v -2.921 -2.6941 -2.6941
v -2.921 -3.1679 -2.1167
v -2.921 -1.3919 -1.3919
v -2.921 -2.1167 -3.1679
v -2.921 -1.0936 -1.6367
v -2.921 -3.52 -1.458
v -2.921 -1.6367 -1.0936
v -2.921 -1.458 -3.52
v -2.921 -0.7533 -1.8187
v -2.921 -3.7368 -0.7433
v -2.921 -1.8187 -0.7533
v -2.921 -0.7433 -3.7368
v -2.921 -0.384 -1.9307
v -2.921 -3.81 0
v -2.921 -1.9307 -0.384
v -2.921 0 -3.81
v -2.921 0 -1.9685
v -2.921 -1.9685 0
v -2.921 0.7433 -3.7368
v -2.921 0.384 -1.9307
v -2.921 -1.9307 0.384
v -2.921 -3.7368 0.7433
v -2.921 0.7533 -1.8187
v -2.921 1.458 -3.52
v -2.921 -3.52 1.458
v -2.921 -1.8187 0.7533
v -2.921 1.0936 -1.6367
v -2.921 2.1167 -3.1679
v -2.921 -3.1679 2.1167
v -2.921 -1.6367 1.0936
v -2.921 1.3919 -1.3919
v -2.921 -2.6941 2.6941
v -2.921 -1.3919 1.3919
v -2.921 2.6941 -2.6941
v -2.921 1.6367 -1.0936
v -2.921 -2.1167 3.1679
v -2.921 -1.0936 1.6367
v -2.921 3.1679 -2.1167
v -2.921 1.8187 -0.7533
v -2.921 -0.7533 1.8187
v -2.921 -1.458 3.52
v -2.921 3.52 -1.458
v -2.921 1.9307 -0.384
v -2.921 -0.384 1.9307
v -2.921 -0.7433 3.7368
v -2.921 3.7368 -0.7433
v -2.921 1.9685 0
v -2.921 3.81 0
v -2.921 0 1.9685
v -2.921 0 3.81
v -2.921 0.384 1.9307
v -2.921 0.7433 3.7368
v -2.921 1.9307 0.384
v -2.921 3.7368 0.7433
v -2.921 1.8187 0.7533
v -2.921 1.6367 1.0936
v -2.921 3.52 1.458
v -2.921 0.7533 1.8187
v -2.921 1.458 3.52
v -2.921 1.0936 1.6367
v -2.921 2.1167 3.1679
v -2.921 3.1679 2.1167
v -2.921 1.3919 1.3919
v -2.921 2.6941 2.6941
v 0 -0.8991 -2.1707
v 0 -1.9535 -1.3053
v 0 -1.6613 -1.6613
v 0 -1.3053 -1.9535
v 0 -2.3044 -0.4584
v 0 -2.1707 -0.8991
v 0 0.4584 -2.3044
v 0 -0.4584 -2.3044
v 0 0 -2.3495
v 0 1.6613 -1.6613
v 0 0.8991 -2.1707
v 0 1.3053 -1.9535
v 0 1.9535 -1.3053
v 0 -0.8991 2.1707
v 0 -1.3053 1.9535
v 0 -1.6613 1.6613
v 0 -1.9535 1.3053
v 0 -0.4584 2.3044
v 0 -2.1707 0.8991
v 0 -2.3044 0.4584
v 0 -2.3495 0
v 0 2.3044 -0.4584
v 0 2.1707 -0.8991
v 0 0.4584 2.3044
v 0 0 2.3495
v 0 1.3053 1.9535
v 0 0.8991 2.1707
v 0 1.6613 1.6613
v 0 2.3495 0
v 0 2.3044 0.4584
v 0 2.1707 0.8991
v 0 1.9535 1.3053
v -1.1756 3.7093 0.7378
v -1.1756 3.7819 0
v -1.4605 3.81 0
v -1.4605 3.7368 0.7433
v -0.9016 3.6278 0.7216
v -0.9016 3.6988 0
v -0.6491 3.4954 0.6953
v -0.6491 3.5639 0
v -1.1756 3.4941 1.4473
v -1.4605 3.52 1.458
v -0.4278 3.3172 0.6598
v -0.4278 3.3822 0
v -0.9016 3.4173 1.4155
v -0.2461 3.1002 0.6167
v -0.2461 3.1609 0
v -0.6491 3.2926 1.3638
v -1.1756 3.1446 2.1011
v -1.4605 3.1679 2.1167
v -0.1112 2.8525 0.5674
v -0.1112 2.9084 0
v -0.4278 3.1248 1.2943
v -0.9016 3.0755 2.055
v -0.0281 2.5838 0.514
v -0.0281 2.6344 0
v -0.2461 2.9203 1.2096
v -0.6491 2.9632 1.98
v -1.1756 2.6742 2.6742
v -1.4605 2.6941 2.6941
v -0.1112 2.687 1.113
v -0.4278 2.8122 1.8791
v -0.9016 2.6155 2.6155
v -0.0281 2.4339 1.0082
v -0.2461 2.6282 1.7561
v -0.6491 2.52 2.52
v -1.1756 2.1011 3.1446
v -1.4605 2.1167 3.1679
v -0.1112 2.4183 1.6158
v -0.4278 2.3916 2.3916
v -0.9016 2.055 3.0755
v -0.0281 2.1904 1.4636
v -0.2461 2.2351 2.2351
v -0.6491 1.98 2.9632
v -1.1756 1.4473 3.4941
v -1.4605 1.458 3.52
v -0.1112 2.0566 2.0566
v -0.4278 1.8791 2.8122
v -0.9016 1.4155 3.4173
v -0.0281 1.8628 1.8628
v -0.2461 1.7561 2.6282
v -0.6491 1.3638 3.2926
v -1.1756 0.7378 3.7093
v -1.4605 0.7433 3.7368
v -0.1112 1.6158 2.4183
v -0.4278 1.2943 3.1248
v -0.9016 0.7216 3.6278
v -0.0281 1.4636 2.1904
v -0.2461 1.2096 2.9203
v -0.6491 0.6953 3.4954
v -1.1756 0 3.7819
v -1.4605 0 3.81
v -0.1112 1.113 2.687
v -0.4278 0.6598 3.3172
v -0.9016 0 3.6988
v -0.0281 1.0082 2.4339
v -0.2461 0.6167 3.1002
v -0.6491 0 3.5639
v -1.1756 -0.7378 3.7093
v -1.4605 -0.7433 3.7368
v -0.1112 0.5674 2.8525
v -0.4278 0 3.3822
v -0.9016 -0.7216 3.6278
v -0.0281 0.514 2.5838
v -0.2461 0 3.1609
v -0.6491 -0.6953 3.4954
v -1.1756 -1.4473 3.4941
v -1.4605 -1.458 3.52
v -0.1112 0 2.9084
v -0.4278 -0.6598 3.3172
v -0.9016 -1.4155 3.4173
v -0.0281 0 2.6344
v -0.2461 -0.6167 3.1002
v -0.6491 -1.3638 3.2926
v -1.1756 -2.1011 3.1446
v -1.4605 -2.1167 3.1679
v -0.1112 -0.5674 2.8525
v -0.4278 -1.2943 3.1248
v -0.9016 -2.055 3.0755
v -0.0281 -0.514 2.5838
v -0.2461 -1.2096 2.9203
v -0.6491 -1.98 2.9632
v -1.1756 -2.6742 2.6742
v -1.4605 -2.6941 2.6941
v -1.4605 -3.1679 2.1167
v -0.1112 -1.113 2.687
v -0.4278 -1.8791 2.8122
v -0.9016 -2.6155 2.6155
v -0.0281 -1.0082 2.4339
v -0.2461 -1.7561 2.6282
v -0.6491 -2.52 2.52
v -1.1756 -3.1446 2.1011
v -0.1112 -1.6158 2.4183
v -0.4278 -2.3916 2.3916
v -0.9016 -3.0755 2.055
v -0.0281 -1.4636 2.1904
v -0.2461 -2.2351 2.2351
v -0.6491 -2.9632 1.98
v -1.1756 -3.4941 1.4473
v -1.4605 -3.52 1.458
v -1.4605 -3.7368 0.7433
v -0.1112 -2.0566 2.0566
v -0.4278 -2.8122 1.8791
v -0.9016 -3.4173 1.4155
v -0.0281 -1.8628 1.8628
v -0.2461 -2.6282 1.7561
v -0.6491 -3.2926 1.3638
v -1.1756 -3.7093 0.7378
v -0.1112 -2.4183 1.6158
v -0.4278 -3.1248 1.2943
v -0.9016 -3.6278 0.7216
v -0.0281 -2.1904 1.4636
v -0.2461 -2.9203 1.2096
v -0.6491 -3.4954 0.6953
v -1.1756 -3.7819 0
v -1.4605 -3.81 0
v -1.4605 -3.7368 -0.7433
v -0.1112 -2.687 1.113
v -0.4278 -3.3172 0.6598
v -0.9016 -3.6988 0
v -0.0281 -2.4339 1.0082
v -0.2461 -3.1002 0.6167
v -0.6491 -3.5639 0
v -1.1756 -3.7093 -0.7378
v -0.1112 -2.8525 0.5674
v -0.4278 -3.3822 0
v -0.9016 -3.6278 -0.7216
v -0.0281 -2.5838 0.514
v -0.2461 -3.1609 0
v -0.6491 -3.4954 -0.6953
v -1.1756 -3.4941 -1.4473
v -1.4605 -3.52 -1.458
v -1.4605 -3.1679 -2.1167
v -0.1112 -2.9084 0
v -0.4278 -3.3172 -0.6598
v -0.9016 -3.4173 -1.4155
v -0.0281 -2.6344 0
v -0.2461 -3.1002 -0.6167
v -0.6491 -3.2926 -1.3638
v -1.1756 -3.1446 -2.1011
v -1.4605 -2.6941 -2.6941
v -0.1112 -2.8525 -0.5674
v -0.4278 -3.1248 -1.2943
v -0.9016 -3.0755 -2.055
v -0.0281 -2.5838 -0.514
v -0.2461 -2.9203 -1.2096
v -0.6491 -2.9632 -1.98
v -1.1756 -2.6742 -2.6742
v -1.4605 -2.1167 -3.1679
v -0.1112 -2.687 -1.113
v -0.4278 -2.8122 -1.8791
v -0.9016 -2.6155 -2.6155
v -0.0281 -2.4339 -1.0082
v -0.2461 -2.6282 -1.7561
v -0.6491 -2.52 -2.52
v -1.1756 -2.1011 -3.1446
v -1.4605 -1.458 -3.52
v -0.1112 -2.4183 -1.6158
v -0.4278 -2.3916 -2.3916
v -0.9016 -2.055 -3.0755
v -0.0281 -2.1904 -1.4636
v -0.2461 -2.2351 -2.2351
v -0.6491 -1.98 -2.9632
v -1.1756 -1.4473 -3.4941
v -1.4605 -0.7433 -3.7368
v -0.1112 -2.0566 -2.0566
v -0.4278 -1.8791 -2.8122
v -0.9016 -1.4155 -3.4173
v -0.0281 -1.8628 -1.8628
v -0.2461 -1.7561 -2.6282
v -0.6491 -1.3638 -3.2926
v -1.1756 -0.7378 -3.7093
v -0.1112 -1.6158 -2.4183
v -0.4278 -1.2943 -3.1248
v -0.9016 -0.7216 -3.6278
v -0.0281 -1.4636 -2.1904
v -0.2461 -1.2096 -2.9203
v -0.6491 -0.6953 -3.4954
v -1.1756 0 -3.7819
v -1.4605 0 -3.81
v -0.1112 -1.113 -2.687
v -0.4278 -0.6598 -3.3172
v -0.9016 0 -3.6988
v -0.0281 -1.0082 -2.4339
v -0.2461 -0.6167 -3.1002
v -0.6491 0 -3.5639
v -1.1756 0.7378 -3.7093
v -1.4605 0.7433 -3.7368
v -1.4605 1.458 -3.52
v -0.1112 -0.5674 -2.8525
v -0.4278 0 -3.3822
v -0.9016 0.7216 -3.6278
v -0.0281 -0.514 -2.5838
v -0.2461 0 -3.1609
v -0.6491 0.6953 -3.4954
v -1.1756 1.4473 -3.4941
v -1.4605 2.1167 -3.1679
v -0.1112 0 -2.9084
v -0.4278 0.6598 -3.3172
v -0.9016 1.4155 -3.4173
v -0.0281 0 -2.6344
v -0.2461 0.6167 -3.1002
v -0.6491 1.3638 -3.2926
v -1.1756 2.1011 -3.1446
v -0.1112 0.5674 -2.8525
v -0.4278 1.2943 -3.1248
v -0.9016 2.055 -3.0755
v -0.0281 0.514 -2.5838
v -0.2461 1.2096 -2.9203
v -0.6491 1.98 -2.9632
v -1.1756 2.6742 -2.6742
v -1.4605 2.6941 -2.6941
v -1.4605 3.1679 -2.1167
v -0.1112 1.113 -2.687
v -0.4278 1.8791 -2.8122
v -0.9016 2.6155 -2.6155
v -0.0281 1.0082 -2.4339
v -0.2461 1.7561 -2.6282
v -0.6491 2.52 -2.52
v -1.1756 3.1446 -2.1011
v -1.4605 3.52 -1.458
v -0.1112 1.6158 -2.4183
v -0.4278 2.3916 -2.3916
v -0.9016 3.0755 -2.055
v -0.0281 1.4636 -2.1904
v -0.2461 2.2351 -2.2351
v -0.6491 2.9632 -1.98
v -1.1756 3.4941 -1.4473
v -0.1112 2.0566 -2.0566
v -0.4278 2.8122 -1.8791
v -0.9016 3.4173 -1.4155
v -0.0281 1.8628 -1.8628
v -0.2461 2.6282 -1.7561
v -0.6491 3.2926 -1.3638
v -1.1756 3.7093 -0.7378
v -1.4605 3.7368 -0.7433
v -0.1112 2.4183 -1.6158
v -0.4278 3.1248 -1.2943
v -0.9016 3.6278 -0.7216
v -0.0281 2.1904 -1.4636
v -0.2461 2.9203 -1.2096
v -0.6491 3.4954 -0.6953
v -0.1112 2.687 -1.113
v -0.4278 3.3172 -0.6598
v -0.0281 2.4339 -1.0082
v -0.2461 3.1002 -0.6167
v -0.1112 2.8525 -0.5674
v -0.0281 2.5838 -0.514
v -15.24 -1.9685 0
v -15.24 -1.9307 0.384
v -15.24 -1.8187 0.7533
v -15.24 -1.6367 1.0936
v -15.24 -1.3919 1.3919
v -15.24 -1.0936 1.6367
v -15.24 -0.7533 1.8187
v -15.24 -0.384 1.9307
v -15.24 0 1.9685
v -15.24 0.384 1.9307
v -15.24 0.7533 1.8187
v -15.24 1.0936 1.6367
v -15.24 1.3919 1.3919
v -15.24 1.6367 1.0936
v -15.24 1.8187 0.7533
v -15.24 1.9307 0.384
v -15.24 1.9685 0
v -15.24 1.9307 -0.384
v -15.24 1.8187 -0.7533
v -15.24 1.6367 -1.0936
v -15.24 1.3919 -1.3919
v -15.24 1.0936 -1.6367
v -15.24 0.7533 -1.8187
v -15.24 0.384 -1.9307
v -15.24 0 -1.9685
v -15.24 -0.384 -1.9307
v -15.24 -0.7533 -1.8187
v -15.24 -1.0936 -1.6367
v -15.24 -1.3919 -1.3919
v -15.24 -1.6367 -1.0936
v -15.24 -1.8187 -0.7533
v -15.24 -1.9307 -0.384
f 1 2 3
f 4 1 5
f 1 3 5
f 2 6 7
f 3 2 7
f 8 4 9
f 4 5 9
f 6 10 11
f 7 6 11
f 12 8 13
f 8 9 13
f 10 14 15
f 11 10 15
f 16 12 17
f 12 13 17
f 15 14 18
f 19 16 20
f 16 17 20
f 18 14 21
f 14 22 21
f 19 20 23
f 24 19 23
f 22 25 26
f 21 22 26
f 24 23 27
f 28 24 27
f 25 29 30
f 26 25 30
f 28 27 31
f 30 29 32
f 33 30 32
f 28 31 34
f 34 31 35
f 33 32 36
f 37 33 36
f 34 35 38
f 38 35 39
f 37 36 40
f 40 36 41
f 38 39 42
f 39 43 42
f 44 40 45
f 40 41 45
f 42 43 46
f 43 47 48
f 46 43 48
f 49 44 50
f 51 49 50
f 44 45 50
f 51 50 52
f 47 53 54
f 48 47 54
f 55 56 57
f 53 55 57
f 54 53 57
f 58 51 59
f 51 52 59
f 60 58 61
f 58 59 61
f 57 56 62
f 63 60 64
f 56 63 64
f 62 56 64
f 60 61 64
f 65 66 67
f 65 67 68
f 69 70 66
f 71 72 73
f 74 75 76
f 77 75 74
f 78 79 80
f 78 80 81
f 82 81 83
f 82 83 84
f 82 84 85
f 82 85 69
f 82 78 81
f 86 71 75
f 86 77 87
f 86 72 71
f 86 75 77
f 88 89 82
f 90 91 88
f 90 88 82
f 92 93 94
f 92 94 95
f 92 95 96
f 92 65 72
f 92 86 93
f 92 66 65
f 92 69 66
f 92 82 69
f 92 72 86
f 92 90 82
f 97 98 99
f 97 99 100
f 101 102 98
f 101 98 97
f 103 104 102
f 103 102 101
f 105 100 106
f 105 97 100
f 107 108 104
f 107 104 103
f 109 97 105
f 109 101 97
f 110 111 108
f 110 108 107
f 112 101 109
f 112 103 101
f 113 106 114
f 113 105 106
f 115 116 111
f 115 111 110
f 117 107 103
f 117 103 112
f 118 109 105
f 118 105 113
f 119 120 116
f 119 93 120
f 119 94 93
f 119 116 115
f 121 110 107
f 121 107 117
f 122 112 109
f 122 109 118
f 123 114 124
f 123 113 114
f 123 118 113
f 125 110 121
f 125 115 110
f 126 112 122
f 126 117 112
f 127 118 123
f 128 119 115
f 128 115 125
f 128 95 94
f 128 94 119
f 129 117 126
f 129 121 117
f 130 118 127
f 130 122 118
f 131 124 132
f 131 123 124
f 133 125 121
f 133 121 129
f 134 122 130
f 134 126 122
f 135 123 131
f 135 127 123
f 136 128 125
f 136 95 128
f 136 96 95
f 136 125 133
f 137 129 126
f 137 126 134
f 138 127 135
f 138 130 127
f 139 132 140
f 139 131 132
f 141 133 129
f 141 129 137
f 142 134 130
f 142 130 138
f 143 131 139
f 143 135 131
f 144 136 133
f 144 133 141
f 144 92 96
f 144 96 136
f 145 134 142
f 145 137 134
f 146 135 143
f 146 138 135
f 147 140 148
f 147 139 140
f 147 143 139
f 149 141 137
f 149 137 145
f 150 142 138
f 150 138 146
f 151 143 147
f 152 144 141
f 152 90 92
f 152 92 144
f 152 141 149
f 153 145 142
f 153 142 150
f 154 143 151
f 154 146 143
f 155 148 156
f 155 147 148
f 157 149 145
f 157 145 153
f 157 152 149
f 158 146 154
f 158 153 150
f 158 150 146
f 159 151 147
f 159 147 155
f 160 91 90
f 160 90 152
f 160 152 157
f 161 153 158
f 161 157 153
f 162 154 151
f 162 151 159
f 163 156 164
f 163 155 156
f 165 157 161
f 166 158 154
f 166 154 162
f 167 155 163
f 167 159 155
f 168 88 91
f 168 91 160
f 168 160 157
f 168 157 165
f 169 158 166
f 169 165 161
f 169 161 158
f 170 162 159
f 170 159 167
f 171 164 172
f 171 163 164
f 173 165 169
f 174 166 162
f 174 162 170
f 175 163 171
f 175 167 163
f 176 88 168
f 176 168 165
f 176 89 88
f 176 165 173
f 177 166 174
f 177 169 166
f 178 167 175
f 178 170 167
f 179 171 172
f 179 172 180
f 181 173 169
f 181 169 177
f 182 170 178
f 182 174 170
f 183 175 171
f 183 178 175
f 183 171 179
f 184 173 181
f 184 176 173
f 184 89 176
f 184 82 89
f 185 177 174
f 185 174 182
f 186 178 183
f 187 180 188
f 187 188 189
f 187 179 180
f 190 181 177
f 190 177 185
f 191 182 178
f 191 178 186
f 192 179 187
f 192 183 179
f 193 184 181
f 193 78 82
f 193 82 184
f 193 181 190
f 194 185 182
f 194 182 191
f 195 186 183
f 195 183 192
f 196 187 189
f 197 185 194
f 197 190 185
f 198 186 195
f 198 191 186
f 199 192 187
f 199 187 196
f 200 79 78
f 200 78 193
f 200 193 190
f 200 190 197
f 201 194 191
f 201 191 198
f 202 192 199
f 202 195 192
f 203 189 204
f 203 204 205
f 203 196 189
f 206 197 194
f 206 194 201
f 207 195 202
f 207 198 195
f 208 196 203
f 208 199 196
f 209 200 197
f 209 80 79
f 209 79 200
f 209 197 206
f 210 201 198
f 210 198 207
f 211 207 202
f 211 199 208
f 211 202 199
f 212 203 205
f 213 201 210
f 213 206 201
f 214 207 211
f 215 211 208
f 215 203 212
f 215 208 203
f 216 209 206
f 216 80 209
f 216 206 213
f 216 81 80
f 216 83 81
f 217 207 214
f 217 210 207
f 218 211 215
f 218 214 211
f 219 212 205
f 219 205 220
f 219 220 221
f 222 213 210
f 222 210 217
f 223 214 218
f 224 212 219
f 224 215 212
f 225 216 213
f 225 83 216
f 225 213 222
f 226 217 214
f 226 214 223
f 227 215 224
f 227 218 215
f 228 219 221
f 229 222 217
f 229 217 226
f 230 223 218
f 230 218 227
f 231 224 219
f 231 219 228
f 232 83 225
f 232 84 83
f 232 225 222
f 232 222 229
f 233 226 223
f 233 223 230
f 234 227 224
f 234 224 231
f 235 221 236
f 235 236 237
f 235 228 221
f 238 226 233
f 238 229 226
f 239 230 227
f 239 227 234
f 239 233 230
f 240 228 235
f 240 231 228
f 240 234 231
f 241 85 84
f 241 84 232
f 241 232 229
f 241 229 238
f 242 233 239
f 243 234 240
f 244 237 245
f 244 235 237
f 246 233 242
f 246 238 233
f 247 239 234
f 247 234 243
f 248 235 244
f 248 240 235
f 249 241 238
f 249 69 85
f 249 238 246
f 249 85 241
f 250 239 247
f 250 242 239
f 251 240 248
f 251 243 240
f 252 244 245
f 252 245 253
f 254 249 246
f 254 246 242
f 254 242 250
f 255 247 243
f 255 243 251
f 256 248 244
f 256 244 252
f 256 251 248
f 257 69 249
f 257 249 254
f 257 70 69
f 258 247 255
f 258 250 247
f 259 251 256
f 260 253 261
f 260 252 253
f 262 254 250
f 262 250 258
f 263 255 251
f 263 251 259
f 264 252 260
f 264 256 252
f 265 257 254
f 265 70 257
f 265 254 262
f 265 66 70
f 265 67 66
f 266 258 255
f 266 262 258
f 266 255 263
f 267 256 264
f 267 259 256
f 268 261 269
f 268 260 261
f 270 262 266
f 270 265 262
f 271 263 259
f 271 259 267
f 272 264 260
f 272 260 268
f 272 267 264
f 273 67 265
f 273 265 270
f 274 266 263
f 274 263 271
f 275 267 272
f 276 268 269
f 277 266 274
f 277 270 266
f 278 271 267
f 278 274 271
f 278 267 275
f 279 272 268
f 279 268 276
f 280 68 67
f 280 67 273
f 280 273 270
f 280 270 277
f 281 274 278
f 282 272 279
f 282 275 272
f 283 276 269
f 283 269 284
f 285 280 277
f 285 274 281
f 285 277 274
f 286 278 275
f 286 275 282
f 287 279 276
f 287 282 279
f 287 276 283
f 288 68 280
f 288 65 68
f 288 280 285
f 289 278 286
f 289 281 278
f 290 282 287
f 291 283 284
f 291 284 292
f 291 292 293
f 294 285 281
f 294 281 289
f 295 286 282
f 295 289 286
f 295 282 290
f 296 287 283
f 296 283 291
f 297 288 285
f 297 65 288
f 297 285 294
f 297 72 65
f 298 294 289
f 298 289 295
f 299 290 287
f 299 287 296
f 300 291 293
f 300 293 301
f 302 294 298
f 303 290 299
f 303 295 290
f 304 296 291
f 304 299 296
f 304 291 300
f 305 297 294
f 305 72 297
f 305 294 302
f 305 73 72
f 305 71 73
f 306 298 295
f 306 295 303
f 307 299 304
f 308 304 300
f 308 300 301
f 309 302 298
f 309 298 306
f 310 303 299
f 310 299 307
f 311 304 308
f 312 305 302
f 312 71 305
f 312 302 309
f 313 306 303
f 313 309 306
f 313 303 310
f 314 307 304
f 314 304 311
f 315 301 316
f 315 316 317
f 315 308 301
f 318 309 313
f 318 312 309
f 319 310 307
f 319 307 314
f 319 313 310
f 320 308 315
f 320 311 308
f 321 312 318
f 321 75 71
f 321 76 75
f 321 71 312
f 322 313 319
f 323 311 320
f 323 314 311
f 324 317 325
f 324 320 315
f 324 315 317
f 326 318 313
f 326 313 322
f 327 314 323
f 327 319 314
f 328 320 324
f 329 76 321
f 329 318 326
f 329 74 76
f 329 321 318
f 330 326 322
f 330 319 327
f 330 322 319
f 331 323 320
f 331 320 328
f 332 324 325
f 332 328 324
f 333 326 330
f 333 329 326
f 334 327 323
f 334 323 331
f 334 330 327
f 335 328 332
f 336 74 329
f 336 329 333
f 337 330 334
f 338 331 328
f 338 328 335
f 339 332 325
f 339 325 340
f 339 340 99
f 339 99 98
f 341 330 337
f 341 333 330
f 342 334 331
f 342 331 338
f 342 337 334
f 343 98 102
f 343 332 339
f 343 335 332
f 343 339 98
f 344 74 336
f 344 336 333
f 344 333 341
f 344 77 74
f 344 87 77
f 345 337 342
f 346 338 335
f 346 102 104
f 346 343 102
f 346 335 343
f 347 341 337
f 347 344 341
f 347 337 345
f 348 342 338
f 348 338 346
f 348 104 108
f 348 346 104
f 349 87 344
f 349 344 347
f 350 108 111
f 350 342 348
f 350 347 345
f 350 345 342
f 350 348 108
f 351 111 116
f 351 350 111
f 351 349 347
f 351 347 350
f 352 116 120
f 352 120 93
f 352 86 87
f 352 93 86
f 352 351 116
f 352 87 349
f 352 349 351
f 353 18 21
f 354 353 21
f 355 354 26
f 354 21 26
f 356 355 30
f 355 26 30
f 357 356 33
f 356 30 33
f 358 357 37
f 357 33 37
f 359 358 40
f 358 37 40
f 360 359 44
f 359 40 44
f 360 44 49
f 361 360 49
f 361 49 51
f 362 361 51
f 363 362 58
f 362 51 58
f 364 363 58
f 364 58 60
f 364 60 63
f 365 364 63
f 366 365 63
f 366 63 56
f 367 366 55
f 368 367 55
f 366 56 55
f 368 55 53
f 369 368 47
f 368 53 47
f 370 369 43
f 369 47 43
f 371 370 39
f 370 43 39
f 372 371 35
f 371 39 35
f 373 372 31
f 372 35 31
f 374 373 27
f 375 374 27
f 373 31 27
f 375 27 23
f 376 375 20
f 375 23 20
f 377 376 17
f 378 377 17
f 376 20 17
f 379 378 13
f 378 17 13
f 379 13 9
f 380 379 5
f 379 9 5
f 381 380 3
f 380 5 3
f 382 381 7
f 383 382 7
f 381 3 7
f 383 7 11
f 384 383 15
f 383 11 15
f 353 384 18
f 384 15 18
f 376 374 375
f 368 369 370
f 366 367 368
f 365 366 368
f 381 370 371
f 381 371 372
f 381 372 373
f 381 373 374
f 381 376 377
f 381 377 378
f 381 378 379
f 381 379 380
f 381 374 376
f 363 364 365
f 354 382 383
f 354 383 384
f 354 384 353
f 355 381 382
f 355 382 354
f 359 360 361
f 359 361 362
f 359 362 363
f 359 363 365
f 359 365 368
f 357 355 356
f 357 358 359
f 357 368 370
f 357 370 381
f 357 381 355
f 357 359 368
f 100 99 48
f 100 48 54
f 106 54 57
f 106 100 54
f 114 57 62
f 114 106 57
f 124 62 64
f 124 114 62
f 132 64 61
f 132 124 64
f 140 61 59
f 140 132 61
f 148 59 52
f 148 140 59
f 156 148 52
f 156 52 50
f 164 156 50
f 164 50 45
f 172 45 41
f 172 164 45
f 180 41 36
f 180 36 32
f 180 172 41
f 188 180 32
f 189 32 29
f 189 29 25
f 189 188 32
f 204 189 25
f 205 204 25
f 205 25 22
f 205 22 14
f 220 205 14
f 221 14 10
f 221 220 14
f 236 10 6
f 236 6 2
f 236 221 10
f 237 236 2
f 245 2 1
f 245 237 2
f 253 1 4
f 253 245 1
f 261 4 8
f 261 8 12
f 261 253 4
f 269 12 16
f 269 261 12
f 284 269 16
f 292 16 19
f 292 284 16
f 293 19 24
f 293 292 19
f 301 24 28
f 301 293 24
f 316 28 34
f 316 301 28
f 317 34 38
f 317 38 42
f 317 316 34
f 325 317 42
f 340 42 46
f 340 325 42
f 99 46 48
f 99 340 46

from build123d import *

# Parameters (mm, degrees)
F0_R     = 3.81
F1_DEPTH = 2.921
F2_R     = 1.4605
F3_R     = 1.9685
F4_DEPTH = 12.319


with BuildPart() as f1:
    # F0 (on Right) → F1 (new body)
    with BuildSketch(Plane.YZ):
        Circle(F0_R)
    extrude(amount=-F1_DEPTH)

    # F2
    f2_edges = [f1.edges().sort_by_distance(p)[0] for p in [
        (0, -3.81, 0),
    ]]
    fillet(f2_edges, radius=F2_R)

    # F3 (on face) → F4 (join)
    with BuildSketch(Plane(origin=(-2.921, 0, 0), x_dir=(0, -1, 0), z_dir=(-1, 0, 0))):
        Circle(F3_R)
    extrude(amount=F4_DEPTH)


solid = f1.part
